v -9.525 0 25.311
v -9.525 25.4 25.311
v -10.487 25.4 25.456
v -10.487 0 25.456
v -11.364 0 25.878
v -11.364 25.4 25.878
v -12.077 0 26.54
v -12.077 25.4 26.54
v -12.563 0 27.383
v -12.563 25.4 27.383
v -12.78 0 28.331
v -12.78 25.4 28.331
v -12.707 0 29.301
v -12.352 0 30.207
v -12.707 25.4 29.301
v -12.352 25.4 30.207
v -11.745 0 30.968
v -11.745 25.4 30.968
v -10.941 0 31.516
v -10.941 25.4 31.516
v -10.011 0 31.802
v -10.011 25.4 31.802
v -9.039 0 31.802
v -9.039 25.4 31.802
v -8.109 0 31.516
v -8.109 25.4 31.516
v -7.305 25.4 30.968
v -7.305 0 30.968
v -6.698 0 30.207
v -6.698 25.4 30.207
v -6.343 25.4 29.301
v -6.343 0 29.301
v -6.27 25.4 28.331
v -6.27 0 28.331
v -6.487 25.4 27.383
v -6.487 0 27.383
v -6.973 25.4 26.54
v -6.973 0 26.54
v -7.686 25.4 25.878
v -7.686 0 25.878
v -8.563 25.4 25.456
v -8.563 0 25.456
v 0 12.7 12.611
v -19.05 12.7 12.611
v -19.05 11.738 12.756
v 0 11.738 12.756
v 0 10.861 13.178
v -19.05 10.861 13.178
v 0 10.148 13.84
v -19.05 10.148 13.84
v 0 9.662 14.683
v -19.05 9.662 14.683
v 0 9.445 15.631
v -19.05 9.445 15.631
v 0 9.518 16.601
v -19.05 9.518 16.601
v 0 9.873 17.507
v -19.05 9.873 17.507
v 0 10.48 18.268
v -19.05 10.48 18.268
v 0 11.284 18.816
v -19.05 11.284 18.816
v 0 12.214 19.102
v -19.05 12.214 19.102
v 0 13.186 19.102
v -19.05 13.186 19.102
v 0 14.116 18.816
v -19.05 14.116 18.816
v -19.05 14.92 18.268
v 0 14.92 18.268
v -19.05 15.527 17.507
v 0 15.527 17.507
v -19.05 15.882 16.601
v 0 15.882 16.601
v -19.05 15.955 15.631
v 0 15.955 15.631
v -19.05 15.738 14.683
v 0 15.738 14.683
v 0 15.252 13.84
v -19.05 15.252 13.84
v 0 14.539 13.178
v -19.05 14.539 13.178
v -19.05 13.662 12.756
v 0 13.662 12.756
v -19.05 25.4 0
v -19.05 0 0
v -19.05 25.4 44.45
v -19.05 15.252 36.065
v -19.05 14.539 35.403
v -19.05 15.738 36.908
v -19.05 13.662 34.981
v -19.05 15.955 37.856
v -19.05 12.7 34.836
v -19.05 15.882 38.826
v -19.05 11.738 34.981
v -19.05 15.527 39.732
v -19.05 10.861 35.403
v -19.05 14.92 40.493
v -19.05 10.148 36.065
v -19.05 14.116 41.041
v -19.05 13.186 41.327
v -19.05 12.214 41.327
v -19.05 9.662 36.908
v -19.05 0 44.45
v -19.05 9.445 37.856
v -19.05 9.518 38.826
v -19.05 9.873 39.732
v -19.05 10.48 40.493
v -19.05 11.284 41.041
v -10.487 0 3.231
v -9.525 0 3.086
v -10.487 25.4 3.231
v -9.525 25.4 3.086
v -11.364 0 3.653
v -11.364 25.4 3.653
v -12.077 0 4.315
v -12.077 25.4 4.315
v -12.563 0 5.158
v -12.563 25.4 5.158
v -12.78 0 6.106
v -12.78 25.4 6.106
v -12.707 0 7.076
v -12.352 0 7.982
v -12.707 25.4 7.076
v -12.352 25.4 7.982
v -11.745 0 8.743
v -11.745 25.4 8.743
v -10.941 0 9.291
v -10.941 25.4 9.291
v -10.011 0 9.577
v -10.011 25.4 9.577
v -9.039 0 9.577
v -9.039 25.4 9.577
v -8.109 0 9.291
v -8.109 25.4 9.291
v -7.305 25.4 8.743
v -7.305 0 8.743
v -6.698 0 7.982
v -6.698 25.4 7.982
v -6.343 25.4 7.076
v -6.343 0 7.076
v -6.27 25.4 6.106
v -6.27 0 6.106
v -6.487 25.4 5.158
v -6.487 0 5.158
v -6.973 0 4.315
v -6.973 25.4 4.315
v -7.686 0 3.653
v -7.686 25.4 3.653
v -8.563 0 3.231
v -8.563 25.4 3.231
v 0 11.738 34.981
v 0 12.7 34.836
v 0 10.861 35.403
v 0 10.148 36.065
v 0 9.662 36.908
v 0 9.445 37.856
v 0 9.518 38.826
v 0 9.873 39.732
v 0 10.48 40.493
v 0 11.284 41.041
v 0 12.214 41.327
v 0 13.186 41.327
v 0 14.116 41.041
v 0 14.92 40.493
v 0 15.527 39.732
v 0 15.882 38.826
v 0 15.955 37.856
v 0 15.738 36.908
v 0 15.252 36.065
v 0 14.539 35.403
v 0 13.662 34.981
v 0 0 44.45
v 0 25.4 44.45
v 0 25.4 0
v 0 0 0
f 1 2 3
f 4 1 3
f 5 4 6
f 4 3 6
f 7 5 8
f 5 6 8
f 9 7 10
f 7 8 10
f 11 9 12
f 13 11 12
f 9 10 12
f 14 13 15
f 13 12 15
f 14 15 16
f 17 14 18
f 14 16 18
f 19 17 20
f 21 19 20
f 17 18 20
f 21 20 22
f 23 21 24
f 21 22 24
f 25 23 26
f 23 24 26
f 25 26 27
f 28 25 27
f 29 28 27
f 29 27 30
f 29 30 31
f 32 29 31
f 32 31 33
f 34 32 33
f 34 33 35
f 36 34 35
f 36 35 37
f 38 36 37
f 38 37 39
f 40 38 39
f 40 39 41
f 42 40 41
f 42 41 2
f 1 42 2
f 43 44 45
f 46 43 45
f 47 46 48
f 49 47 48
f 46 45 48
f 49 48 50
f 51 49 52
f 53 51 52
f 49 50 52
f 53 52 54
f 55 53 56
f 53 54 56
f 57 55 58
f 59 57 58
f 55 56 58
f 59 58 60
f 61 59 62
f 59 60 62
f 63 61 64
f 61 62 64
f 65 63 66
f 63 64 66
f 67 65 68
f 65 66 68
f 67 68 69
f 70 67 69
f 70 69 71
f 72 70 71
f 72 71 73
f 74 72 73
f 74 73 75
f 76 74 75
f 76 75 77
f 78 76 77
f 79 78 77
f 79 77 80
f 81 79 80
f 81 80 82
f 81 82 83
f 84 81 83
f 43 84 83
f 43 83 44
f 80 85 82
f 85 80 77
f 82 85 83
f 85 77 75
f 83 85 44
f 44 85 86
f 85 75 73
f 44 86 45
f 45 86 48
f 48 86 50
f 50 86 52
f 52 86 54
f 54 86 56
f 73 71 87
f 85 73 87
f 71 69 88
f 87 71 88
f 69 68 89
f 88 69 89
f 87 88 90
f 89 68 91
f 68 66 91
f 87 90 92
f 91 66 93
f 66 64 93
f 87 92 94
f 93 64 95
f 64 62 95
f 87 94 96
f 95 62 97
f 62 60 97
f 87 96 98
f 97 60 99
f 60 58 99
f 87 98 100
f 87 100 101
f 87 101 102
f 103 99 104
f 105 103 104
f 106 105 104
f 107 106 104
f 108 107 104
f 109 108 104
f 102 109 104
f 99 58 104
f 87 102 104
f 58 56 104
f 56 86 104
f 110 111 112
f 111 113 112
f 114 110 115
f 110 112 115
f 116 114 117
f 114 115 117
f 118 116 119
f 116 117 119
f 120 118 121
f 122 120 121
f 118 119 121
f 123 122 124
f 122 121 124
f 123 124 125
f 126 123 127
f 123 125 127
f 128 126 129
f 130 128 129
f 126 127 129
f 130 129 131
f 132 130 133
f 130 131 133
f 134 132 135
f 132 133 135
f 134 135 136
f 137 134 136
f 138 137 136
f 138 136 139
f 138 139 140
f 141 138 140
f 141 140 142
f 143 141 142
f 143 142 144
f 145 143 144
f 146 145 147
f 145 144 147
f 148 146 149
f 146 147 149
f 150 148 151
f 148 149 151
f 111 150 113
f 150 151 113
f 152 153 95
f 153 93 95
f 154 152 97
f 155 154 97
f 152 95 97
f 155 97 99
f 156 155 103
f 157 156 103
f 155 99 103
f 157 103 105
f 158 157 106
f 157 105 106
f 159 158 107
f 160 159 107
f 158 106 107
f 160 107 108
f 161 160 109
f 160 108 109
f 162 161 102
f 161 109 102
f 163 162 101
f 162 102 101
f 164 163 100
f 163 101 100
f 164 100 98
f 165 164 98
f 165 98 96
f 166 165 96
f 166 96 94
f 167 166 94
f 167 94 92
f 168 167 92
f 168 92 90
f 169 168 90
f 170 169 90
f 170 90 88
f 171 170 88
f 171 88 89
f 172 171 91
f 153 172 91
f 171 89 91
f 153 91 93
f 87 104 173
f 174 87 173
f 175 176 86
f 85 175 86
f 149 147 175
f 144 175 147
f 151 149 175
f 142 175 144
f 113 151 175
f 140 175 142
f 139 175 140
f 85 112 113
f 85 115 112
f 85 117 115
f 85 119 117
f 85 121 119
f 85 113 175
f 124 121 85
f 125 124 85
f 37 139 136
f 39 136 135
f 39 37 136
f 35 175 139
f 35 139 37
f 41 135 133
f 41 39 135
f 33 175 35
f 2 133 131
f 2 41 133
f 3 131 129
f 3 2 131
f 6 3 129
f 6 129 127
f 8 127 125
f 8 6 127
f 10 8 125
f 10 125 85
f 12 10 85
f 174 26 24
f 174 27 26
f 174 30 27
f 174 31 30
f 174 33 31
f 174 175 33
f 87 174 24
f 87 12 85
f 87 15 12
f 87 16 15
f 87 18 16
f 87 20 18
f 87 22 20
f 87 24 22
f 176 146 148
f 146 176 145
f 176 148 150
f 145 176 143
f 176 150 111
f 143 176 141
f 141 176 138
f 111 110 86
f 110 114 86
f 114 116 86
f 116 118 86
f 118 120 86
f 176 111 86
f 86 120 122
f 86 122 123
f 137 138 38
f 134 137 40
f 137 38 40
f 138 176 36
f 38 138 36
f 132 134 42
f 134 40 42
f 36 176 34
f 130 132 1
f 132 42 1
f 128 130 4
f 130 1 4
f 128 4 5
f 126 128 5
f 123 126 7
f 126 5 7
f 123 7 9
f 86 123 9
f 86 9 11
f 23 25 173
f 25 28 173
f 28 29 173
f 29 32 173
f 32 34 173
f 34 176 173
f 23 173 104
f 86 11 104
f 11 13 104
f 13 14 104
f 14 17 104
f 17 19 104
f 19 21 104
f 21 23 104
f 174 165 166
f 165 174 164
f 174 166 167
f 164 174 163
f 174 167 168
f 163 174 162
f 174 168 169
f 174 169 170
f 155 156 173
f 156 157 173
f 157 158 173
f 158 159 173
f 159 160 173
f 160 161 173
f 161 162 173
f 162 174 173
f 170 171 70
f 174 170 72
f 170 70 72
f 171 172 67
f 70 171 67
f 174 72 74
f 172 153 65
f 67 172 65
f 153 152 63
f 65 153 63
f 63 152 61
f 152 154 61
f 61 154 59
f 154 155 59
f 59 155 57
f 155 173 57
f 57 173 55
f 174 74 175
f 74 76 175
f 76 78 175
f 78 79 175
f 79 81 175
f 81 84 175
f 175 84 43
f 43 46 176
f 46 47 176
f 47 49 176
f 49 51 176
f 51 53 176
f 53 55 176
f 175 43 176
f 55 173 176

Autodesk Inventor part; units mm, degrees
ref_plane "YZ Plane" through (0, 0, 0) normal (1, 0, 0) x (0, 1, 0)
ref_plane "XZ Plane" through (0, 0, 0) normal (0, 1, 0) x (-1, 0, 0)
ref_plane "XY Plane" through (0, 0, 0) normal (0, 0, 1) x (1, 0, 0)
sketch "Sketch1" plane through (0, 0, 0) normal (0, 1, 0) x (-1, 0, 0)
  line L0 (0, 0) -> (19.05, 0)
  line L1 (19.05, 0) -> (19.05, 44.45)
  line L2 (19.05, 44.45) -> (0, 44.45)
  line L3 (0, 44.45) -> (0, 0)
  dimension "d0" = 19.05
  dimension "d1" = 44.45
extrude "Extrusion1" add sketch "Sketch1" along normal blind 25.4
sketch "Sketch2" plane through (0, 0, 44.45) normal (1, 0, 0) x (0, 0, -1)
  line L0 (0, 0) -> (44.45, 0) projected
  line L1 (0, 0) -> (0, 25.4) projected
  line L2 (44.45, 0) -> (44.45, 25.4) projected
  point P0 (6.35, 12.7)
  point P1 (34.925, 12.7)
  point P2 (44.45, 12.7)
  dimension "d4" = 12.7
  dimension "d5" = 12.7
  dimension "d6" = 6.35
  dimension "d7" = 9.525
hole "Hole1" at (0, 12.7, 38.1) direction (-1, 0, 0) diameter 6.5278 depth 50.8 tip angle 118
sketch "Sketch3" plane through (0, 0, 0) normal (0, -1, 0) x (1, 0, 0)
  line L0 (0, 44.45) -> (0, 0) projected
  line L1 (-19.05, 44.45) -> (0, 44.45) projected
  point P0 (-9.525, 28.575)
  point P1 (-9.525, 9.6957)
  dimension "d15" = 9.525
  dimension "d16" = 15.875
hole "Hole2" at (-9.525, 0, 28.575) direction (0, 1, 0) diameter 6.5278 depth 50.8 tip angle 118
sketch "Sketch4" plane through (0, 0, 44.45) normal (1, 0, 0) x (0, 0, -1)
  line L0 (0, 25.4) -> (44.45, 25.4) projected
  line L1 (0, 0) -> (0, 25.4) projected
  point P0 (44.45, 0)
  point P1 (28.575, 12.7)
  dimension "d24" = 12.7
  dimension "d25" = 28.575
sketch "Sketch5" plane through (0, 0, 0) normal (0, -1, 0) x (1, 0, 0)
  line L0 (0, 44.45) -> (0, 0) projected
  line L1 (0, 0) -> (-19.05, 0) projected
  point P0 (-9.525, 6.35)
  dimension "d26" = 9.525
  dimension "d27" = 6.35
hole "Hole3" at (-9.525, 0, 6.35) direction (0, 1, 0) diameter 6.5278 depth 50.8 tip angle 118
hole "Hole4" at (0, 12.7, 15.875) direction (-1, 0, 0) diameter 6.5278 depth 50.8 tip angle 118
properties part number "200522"
